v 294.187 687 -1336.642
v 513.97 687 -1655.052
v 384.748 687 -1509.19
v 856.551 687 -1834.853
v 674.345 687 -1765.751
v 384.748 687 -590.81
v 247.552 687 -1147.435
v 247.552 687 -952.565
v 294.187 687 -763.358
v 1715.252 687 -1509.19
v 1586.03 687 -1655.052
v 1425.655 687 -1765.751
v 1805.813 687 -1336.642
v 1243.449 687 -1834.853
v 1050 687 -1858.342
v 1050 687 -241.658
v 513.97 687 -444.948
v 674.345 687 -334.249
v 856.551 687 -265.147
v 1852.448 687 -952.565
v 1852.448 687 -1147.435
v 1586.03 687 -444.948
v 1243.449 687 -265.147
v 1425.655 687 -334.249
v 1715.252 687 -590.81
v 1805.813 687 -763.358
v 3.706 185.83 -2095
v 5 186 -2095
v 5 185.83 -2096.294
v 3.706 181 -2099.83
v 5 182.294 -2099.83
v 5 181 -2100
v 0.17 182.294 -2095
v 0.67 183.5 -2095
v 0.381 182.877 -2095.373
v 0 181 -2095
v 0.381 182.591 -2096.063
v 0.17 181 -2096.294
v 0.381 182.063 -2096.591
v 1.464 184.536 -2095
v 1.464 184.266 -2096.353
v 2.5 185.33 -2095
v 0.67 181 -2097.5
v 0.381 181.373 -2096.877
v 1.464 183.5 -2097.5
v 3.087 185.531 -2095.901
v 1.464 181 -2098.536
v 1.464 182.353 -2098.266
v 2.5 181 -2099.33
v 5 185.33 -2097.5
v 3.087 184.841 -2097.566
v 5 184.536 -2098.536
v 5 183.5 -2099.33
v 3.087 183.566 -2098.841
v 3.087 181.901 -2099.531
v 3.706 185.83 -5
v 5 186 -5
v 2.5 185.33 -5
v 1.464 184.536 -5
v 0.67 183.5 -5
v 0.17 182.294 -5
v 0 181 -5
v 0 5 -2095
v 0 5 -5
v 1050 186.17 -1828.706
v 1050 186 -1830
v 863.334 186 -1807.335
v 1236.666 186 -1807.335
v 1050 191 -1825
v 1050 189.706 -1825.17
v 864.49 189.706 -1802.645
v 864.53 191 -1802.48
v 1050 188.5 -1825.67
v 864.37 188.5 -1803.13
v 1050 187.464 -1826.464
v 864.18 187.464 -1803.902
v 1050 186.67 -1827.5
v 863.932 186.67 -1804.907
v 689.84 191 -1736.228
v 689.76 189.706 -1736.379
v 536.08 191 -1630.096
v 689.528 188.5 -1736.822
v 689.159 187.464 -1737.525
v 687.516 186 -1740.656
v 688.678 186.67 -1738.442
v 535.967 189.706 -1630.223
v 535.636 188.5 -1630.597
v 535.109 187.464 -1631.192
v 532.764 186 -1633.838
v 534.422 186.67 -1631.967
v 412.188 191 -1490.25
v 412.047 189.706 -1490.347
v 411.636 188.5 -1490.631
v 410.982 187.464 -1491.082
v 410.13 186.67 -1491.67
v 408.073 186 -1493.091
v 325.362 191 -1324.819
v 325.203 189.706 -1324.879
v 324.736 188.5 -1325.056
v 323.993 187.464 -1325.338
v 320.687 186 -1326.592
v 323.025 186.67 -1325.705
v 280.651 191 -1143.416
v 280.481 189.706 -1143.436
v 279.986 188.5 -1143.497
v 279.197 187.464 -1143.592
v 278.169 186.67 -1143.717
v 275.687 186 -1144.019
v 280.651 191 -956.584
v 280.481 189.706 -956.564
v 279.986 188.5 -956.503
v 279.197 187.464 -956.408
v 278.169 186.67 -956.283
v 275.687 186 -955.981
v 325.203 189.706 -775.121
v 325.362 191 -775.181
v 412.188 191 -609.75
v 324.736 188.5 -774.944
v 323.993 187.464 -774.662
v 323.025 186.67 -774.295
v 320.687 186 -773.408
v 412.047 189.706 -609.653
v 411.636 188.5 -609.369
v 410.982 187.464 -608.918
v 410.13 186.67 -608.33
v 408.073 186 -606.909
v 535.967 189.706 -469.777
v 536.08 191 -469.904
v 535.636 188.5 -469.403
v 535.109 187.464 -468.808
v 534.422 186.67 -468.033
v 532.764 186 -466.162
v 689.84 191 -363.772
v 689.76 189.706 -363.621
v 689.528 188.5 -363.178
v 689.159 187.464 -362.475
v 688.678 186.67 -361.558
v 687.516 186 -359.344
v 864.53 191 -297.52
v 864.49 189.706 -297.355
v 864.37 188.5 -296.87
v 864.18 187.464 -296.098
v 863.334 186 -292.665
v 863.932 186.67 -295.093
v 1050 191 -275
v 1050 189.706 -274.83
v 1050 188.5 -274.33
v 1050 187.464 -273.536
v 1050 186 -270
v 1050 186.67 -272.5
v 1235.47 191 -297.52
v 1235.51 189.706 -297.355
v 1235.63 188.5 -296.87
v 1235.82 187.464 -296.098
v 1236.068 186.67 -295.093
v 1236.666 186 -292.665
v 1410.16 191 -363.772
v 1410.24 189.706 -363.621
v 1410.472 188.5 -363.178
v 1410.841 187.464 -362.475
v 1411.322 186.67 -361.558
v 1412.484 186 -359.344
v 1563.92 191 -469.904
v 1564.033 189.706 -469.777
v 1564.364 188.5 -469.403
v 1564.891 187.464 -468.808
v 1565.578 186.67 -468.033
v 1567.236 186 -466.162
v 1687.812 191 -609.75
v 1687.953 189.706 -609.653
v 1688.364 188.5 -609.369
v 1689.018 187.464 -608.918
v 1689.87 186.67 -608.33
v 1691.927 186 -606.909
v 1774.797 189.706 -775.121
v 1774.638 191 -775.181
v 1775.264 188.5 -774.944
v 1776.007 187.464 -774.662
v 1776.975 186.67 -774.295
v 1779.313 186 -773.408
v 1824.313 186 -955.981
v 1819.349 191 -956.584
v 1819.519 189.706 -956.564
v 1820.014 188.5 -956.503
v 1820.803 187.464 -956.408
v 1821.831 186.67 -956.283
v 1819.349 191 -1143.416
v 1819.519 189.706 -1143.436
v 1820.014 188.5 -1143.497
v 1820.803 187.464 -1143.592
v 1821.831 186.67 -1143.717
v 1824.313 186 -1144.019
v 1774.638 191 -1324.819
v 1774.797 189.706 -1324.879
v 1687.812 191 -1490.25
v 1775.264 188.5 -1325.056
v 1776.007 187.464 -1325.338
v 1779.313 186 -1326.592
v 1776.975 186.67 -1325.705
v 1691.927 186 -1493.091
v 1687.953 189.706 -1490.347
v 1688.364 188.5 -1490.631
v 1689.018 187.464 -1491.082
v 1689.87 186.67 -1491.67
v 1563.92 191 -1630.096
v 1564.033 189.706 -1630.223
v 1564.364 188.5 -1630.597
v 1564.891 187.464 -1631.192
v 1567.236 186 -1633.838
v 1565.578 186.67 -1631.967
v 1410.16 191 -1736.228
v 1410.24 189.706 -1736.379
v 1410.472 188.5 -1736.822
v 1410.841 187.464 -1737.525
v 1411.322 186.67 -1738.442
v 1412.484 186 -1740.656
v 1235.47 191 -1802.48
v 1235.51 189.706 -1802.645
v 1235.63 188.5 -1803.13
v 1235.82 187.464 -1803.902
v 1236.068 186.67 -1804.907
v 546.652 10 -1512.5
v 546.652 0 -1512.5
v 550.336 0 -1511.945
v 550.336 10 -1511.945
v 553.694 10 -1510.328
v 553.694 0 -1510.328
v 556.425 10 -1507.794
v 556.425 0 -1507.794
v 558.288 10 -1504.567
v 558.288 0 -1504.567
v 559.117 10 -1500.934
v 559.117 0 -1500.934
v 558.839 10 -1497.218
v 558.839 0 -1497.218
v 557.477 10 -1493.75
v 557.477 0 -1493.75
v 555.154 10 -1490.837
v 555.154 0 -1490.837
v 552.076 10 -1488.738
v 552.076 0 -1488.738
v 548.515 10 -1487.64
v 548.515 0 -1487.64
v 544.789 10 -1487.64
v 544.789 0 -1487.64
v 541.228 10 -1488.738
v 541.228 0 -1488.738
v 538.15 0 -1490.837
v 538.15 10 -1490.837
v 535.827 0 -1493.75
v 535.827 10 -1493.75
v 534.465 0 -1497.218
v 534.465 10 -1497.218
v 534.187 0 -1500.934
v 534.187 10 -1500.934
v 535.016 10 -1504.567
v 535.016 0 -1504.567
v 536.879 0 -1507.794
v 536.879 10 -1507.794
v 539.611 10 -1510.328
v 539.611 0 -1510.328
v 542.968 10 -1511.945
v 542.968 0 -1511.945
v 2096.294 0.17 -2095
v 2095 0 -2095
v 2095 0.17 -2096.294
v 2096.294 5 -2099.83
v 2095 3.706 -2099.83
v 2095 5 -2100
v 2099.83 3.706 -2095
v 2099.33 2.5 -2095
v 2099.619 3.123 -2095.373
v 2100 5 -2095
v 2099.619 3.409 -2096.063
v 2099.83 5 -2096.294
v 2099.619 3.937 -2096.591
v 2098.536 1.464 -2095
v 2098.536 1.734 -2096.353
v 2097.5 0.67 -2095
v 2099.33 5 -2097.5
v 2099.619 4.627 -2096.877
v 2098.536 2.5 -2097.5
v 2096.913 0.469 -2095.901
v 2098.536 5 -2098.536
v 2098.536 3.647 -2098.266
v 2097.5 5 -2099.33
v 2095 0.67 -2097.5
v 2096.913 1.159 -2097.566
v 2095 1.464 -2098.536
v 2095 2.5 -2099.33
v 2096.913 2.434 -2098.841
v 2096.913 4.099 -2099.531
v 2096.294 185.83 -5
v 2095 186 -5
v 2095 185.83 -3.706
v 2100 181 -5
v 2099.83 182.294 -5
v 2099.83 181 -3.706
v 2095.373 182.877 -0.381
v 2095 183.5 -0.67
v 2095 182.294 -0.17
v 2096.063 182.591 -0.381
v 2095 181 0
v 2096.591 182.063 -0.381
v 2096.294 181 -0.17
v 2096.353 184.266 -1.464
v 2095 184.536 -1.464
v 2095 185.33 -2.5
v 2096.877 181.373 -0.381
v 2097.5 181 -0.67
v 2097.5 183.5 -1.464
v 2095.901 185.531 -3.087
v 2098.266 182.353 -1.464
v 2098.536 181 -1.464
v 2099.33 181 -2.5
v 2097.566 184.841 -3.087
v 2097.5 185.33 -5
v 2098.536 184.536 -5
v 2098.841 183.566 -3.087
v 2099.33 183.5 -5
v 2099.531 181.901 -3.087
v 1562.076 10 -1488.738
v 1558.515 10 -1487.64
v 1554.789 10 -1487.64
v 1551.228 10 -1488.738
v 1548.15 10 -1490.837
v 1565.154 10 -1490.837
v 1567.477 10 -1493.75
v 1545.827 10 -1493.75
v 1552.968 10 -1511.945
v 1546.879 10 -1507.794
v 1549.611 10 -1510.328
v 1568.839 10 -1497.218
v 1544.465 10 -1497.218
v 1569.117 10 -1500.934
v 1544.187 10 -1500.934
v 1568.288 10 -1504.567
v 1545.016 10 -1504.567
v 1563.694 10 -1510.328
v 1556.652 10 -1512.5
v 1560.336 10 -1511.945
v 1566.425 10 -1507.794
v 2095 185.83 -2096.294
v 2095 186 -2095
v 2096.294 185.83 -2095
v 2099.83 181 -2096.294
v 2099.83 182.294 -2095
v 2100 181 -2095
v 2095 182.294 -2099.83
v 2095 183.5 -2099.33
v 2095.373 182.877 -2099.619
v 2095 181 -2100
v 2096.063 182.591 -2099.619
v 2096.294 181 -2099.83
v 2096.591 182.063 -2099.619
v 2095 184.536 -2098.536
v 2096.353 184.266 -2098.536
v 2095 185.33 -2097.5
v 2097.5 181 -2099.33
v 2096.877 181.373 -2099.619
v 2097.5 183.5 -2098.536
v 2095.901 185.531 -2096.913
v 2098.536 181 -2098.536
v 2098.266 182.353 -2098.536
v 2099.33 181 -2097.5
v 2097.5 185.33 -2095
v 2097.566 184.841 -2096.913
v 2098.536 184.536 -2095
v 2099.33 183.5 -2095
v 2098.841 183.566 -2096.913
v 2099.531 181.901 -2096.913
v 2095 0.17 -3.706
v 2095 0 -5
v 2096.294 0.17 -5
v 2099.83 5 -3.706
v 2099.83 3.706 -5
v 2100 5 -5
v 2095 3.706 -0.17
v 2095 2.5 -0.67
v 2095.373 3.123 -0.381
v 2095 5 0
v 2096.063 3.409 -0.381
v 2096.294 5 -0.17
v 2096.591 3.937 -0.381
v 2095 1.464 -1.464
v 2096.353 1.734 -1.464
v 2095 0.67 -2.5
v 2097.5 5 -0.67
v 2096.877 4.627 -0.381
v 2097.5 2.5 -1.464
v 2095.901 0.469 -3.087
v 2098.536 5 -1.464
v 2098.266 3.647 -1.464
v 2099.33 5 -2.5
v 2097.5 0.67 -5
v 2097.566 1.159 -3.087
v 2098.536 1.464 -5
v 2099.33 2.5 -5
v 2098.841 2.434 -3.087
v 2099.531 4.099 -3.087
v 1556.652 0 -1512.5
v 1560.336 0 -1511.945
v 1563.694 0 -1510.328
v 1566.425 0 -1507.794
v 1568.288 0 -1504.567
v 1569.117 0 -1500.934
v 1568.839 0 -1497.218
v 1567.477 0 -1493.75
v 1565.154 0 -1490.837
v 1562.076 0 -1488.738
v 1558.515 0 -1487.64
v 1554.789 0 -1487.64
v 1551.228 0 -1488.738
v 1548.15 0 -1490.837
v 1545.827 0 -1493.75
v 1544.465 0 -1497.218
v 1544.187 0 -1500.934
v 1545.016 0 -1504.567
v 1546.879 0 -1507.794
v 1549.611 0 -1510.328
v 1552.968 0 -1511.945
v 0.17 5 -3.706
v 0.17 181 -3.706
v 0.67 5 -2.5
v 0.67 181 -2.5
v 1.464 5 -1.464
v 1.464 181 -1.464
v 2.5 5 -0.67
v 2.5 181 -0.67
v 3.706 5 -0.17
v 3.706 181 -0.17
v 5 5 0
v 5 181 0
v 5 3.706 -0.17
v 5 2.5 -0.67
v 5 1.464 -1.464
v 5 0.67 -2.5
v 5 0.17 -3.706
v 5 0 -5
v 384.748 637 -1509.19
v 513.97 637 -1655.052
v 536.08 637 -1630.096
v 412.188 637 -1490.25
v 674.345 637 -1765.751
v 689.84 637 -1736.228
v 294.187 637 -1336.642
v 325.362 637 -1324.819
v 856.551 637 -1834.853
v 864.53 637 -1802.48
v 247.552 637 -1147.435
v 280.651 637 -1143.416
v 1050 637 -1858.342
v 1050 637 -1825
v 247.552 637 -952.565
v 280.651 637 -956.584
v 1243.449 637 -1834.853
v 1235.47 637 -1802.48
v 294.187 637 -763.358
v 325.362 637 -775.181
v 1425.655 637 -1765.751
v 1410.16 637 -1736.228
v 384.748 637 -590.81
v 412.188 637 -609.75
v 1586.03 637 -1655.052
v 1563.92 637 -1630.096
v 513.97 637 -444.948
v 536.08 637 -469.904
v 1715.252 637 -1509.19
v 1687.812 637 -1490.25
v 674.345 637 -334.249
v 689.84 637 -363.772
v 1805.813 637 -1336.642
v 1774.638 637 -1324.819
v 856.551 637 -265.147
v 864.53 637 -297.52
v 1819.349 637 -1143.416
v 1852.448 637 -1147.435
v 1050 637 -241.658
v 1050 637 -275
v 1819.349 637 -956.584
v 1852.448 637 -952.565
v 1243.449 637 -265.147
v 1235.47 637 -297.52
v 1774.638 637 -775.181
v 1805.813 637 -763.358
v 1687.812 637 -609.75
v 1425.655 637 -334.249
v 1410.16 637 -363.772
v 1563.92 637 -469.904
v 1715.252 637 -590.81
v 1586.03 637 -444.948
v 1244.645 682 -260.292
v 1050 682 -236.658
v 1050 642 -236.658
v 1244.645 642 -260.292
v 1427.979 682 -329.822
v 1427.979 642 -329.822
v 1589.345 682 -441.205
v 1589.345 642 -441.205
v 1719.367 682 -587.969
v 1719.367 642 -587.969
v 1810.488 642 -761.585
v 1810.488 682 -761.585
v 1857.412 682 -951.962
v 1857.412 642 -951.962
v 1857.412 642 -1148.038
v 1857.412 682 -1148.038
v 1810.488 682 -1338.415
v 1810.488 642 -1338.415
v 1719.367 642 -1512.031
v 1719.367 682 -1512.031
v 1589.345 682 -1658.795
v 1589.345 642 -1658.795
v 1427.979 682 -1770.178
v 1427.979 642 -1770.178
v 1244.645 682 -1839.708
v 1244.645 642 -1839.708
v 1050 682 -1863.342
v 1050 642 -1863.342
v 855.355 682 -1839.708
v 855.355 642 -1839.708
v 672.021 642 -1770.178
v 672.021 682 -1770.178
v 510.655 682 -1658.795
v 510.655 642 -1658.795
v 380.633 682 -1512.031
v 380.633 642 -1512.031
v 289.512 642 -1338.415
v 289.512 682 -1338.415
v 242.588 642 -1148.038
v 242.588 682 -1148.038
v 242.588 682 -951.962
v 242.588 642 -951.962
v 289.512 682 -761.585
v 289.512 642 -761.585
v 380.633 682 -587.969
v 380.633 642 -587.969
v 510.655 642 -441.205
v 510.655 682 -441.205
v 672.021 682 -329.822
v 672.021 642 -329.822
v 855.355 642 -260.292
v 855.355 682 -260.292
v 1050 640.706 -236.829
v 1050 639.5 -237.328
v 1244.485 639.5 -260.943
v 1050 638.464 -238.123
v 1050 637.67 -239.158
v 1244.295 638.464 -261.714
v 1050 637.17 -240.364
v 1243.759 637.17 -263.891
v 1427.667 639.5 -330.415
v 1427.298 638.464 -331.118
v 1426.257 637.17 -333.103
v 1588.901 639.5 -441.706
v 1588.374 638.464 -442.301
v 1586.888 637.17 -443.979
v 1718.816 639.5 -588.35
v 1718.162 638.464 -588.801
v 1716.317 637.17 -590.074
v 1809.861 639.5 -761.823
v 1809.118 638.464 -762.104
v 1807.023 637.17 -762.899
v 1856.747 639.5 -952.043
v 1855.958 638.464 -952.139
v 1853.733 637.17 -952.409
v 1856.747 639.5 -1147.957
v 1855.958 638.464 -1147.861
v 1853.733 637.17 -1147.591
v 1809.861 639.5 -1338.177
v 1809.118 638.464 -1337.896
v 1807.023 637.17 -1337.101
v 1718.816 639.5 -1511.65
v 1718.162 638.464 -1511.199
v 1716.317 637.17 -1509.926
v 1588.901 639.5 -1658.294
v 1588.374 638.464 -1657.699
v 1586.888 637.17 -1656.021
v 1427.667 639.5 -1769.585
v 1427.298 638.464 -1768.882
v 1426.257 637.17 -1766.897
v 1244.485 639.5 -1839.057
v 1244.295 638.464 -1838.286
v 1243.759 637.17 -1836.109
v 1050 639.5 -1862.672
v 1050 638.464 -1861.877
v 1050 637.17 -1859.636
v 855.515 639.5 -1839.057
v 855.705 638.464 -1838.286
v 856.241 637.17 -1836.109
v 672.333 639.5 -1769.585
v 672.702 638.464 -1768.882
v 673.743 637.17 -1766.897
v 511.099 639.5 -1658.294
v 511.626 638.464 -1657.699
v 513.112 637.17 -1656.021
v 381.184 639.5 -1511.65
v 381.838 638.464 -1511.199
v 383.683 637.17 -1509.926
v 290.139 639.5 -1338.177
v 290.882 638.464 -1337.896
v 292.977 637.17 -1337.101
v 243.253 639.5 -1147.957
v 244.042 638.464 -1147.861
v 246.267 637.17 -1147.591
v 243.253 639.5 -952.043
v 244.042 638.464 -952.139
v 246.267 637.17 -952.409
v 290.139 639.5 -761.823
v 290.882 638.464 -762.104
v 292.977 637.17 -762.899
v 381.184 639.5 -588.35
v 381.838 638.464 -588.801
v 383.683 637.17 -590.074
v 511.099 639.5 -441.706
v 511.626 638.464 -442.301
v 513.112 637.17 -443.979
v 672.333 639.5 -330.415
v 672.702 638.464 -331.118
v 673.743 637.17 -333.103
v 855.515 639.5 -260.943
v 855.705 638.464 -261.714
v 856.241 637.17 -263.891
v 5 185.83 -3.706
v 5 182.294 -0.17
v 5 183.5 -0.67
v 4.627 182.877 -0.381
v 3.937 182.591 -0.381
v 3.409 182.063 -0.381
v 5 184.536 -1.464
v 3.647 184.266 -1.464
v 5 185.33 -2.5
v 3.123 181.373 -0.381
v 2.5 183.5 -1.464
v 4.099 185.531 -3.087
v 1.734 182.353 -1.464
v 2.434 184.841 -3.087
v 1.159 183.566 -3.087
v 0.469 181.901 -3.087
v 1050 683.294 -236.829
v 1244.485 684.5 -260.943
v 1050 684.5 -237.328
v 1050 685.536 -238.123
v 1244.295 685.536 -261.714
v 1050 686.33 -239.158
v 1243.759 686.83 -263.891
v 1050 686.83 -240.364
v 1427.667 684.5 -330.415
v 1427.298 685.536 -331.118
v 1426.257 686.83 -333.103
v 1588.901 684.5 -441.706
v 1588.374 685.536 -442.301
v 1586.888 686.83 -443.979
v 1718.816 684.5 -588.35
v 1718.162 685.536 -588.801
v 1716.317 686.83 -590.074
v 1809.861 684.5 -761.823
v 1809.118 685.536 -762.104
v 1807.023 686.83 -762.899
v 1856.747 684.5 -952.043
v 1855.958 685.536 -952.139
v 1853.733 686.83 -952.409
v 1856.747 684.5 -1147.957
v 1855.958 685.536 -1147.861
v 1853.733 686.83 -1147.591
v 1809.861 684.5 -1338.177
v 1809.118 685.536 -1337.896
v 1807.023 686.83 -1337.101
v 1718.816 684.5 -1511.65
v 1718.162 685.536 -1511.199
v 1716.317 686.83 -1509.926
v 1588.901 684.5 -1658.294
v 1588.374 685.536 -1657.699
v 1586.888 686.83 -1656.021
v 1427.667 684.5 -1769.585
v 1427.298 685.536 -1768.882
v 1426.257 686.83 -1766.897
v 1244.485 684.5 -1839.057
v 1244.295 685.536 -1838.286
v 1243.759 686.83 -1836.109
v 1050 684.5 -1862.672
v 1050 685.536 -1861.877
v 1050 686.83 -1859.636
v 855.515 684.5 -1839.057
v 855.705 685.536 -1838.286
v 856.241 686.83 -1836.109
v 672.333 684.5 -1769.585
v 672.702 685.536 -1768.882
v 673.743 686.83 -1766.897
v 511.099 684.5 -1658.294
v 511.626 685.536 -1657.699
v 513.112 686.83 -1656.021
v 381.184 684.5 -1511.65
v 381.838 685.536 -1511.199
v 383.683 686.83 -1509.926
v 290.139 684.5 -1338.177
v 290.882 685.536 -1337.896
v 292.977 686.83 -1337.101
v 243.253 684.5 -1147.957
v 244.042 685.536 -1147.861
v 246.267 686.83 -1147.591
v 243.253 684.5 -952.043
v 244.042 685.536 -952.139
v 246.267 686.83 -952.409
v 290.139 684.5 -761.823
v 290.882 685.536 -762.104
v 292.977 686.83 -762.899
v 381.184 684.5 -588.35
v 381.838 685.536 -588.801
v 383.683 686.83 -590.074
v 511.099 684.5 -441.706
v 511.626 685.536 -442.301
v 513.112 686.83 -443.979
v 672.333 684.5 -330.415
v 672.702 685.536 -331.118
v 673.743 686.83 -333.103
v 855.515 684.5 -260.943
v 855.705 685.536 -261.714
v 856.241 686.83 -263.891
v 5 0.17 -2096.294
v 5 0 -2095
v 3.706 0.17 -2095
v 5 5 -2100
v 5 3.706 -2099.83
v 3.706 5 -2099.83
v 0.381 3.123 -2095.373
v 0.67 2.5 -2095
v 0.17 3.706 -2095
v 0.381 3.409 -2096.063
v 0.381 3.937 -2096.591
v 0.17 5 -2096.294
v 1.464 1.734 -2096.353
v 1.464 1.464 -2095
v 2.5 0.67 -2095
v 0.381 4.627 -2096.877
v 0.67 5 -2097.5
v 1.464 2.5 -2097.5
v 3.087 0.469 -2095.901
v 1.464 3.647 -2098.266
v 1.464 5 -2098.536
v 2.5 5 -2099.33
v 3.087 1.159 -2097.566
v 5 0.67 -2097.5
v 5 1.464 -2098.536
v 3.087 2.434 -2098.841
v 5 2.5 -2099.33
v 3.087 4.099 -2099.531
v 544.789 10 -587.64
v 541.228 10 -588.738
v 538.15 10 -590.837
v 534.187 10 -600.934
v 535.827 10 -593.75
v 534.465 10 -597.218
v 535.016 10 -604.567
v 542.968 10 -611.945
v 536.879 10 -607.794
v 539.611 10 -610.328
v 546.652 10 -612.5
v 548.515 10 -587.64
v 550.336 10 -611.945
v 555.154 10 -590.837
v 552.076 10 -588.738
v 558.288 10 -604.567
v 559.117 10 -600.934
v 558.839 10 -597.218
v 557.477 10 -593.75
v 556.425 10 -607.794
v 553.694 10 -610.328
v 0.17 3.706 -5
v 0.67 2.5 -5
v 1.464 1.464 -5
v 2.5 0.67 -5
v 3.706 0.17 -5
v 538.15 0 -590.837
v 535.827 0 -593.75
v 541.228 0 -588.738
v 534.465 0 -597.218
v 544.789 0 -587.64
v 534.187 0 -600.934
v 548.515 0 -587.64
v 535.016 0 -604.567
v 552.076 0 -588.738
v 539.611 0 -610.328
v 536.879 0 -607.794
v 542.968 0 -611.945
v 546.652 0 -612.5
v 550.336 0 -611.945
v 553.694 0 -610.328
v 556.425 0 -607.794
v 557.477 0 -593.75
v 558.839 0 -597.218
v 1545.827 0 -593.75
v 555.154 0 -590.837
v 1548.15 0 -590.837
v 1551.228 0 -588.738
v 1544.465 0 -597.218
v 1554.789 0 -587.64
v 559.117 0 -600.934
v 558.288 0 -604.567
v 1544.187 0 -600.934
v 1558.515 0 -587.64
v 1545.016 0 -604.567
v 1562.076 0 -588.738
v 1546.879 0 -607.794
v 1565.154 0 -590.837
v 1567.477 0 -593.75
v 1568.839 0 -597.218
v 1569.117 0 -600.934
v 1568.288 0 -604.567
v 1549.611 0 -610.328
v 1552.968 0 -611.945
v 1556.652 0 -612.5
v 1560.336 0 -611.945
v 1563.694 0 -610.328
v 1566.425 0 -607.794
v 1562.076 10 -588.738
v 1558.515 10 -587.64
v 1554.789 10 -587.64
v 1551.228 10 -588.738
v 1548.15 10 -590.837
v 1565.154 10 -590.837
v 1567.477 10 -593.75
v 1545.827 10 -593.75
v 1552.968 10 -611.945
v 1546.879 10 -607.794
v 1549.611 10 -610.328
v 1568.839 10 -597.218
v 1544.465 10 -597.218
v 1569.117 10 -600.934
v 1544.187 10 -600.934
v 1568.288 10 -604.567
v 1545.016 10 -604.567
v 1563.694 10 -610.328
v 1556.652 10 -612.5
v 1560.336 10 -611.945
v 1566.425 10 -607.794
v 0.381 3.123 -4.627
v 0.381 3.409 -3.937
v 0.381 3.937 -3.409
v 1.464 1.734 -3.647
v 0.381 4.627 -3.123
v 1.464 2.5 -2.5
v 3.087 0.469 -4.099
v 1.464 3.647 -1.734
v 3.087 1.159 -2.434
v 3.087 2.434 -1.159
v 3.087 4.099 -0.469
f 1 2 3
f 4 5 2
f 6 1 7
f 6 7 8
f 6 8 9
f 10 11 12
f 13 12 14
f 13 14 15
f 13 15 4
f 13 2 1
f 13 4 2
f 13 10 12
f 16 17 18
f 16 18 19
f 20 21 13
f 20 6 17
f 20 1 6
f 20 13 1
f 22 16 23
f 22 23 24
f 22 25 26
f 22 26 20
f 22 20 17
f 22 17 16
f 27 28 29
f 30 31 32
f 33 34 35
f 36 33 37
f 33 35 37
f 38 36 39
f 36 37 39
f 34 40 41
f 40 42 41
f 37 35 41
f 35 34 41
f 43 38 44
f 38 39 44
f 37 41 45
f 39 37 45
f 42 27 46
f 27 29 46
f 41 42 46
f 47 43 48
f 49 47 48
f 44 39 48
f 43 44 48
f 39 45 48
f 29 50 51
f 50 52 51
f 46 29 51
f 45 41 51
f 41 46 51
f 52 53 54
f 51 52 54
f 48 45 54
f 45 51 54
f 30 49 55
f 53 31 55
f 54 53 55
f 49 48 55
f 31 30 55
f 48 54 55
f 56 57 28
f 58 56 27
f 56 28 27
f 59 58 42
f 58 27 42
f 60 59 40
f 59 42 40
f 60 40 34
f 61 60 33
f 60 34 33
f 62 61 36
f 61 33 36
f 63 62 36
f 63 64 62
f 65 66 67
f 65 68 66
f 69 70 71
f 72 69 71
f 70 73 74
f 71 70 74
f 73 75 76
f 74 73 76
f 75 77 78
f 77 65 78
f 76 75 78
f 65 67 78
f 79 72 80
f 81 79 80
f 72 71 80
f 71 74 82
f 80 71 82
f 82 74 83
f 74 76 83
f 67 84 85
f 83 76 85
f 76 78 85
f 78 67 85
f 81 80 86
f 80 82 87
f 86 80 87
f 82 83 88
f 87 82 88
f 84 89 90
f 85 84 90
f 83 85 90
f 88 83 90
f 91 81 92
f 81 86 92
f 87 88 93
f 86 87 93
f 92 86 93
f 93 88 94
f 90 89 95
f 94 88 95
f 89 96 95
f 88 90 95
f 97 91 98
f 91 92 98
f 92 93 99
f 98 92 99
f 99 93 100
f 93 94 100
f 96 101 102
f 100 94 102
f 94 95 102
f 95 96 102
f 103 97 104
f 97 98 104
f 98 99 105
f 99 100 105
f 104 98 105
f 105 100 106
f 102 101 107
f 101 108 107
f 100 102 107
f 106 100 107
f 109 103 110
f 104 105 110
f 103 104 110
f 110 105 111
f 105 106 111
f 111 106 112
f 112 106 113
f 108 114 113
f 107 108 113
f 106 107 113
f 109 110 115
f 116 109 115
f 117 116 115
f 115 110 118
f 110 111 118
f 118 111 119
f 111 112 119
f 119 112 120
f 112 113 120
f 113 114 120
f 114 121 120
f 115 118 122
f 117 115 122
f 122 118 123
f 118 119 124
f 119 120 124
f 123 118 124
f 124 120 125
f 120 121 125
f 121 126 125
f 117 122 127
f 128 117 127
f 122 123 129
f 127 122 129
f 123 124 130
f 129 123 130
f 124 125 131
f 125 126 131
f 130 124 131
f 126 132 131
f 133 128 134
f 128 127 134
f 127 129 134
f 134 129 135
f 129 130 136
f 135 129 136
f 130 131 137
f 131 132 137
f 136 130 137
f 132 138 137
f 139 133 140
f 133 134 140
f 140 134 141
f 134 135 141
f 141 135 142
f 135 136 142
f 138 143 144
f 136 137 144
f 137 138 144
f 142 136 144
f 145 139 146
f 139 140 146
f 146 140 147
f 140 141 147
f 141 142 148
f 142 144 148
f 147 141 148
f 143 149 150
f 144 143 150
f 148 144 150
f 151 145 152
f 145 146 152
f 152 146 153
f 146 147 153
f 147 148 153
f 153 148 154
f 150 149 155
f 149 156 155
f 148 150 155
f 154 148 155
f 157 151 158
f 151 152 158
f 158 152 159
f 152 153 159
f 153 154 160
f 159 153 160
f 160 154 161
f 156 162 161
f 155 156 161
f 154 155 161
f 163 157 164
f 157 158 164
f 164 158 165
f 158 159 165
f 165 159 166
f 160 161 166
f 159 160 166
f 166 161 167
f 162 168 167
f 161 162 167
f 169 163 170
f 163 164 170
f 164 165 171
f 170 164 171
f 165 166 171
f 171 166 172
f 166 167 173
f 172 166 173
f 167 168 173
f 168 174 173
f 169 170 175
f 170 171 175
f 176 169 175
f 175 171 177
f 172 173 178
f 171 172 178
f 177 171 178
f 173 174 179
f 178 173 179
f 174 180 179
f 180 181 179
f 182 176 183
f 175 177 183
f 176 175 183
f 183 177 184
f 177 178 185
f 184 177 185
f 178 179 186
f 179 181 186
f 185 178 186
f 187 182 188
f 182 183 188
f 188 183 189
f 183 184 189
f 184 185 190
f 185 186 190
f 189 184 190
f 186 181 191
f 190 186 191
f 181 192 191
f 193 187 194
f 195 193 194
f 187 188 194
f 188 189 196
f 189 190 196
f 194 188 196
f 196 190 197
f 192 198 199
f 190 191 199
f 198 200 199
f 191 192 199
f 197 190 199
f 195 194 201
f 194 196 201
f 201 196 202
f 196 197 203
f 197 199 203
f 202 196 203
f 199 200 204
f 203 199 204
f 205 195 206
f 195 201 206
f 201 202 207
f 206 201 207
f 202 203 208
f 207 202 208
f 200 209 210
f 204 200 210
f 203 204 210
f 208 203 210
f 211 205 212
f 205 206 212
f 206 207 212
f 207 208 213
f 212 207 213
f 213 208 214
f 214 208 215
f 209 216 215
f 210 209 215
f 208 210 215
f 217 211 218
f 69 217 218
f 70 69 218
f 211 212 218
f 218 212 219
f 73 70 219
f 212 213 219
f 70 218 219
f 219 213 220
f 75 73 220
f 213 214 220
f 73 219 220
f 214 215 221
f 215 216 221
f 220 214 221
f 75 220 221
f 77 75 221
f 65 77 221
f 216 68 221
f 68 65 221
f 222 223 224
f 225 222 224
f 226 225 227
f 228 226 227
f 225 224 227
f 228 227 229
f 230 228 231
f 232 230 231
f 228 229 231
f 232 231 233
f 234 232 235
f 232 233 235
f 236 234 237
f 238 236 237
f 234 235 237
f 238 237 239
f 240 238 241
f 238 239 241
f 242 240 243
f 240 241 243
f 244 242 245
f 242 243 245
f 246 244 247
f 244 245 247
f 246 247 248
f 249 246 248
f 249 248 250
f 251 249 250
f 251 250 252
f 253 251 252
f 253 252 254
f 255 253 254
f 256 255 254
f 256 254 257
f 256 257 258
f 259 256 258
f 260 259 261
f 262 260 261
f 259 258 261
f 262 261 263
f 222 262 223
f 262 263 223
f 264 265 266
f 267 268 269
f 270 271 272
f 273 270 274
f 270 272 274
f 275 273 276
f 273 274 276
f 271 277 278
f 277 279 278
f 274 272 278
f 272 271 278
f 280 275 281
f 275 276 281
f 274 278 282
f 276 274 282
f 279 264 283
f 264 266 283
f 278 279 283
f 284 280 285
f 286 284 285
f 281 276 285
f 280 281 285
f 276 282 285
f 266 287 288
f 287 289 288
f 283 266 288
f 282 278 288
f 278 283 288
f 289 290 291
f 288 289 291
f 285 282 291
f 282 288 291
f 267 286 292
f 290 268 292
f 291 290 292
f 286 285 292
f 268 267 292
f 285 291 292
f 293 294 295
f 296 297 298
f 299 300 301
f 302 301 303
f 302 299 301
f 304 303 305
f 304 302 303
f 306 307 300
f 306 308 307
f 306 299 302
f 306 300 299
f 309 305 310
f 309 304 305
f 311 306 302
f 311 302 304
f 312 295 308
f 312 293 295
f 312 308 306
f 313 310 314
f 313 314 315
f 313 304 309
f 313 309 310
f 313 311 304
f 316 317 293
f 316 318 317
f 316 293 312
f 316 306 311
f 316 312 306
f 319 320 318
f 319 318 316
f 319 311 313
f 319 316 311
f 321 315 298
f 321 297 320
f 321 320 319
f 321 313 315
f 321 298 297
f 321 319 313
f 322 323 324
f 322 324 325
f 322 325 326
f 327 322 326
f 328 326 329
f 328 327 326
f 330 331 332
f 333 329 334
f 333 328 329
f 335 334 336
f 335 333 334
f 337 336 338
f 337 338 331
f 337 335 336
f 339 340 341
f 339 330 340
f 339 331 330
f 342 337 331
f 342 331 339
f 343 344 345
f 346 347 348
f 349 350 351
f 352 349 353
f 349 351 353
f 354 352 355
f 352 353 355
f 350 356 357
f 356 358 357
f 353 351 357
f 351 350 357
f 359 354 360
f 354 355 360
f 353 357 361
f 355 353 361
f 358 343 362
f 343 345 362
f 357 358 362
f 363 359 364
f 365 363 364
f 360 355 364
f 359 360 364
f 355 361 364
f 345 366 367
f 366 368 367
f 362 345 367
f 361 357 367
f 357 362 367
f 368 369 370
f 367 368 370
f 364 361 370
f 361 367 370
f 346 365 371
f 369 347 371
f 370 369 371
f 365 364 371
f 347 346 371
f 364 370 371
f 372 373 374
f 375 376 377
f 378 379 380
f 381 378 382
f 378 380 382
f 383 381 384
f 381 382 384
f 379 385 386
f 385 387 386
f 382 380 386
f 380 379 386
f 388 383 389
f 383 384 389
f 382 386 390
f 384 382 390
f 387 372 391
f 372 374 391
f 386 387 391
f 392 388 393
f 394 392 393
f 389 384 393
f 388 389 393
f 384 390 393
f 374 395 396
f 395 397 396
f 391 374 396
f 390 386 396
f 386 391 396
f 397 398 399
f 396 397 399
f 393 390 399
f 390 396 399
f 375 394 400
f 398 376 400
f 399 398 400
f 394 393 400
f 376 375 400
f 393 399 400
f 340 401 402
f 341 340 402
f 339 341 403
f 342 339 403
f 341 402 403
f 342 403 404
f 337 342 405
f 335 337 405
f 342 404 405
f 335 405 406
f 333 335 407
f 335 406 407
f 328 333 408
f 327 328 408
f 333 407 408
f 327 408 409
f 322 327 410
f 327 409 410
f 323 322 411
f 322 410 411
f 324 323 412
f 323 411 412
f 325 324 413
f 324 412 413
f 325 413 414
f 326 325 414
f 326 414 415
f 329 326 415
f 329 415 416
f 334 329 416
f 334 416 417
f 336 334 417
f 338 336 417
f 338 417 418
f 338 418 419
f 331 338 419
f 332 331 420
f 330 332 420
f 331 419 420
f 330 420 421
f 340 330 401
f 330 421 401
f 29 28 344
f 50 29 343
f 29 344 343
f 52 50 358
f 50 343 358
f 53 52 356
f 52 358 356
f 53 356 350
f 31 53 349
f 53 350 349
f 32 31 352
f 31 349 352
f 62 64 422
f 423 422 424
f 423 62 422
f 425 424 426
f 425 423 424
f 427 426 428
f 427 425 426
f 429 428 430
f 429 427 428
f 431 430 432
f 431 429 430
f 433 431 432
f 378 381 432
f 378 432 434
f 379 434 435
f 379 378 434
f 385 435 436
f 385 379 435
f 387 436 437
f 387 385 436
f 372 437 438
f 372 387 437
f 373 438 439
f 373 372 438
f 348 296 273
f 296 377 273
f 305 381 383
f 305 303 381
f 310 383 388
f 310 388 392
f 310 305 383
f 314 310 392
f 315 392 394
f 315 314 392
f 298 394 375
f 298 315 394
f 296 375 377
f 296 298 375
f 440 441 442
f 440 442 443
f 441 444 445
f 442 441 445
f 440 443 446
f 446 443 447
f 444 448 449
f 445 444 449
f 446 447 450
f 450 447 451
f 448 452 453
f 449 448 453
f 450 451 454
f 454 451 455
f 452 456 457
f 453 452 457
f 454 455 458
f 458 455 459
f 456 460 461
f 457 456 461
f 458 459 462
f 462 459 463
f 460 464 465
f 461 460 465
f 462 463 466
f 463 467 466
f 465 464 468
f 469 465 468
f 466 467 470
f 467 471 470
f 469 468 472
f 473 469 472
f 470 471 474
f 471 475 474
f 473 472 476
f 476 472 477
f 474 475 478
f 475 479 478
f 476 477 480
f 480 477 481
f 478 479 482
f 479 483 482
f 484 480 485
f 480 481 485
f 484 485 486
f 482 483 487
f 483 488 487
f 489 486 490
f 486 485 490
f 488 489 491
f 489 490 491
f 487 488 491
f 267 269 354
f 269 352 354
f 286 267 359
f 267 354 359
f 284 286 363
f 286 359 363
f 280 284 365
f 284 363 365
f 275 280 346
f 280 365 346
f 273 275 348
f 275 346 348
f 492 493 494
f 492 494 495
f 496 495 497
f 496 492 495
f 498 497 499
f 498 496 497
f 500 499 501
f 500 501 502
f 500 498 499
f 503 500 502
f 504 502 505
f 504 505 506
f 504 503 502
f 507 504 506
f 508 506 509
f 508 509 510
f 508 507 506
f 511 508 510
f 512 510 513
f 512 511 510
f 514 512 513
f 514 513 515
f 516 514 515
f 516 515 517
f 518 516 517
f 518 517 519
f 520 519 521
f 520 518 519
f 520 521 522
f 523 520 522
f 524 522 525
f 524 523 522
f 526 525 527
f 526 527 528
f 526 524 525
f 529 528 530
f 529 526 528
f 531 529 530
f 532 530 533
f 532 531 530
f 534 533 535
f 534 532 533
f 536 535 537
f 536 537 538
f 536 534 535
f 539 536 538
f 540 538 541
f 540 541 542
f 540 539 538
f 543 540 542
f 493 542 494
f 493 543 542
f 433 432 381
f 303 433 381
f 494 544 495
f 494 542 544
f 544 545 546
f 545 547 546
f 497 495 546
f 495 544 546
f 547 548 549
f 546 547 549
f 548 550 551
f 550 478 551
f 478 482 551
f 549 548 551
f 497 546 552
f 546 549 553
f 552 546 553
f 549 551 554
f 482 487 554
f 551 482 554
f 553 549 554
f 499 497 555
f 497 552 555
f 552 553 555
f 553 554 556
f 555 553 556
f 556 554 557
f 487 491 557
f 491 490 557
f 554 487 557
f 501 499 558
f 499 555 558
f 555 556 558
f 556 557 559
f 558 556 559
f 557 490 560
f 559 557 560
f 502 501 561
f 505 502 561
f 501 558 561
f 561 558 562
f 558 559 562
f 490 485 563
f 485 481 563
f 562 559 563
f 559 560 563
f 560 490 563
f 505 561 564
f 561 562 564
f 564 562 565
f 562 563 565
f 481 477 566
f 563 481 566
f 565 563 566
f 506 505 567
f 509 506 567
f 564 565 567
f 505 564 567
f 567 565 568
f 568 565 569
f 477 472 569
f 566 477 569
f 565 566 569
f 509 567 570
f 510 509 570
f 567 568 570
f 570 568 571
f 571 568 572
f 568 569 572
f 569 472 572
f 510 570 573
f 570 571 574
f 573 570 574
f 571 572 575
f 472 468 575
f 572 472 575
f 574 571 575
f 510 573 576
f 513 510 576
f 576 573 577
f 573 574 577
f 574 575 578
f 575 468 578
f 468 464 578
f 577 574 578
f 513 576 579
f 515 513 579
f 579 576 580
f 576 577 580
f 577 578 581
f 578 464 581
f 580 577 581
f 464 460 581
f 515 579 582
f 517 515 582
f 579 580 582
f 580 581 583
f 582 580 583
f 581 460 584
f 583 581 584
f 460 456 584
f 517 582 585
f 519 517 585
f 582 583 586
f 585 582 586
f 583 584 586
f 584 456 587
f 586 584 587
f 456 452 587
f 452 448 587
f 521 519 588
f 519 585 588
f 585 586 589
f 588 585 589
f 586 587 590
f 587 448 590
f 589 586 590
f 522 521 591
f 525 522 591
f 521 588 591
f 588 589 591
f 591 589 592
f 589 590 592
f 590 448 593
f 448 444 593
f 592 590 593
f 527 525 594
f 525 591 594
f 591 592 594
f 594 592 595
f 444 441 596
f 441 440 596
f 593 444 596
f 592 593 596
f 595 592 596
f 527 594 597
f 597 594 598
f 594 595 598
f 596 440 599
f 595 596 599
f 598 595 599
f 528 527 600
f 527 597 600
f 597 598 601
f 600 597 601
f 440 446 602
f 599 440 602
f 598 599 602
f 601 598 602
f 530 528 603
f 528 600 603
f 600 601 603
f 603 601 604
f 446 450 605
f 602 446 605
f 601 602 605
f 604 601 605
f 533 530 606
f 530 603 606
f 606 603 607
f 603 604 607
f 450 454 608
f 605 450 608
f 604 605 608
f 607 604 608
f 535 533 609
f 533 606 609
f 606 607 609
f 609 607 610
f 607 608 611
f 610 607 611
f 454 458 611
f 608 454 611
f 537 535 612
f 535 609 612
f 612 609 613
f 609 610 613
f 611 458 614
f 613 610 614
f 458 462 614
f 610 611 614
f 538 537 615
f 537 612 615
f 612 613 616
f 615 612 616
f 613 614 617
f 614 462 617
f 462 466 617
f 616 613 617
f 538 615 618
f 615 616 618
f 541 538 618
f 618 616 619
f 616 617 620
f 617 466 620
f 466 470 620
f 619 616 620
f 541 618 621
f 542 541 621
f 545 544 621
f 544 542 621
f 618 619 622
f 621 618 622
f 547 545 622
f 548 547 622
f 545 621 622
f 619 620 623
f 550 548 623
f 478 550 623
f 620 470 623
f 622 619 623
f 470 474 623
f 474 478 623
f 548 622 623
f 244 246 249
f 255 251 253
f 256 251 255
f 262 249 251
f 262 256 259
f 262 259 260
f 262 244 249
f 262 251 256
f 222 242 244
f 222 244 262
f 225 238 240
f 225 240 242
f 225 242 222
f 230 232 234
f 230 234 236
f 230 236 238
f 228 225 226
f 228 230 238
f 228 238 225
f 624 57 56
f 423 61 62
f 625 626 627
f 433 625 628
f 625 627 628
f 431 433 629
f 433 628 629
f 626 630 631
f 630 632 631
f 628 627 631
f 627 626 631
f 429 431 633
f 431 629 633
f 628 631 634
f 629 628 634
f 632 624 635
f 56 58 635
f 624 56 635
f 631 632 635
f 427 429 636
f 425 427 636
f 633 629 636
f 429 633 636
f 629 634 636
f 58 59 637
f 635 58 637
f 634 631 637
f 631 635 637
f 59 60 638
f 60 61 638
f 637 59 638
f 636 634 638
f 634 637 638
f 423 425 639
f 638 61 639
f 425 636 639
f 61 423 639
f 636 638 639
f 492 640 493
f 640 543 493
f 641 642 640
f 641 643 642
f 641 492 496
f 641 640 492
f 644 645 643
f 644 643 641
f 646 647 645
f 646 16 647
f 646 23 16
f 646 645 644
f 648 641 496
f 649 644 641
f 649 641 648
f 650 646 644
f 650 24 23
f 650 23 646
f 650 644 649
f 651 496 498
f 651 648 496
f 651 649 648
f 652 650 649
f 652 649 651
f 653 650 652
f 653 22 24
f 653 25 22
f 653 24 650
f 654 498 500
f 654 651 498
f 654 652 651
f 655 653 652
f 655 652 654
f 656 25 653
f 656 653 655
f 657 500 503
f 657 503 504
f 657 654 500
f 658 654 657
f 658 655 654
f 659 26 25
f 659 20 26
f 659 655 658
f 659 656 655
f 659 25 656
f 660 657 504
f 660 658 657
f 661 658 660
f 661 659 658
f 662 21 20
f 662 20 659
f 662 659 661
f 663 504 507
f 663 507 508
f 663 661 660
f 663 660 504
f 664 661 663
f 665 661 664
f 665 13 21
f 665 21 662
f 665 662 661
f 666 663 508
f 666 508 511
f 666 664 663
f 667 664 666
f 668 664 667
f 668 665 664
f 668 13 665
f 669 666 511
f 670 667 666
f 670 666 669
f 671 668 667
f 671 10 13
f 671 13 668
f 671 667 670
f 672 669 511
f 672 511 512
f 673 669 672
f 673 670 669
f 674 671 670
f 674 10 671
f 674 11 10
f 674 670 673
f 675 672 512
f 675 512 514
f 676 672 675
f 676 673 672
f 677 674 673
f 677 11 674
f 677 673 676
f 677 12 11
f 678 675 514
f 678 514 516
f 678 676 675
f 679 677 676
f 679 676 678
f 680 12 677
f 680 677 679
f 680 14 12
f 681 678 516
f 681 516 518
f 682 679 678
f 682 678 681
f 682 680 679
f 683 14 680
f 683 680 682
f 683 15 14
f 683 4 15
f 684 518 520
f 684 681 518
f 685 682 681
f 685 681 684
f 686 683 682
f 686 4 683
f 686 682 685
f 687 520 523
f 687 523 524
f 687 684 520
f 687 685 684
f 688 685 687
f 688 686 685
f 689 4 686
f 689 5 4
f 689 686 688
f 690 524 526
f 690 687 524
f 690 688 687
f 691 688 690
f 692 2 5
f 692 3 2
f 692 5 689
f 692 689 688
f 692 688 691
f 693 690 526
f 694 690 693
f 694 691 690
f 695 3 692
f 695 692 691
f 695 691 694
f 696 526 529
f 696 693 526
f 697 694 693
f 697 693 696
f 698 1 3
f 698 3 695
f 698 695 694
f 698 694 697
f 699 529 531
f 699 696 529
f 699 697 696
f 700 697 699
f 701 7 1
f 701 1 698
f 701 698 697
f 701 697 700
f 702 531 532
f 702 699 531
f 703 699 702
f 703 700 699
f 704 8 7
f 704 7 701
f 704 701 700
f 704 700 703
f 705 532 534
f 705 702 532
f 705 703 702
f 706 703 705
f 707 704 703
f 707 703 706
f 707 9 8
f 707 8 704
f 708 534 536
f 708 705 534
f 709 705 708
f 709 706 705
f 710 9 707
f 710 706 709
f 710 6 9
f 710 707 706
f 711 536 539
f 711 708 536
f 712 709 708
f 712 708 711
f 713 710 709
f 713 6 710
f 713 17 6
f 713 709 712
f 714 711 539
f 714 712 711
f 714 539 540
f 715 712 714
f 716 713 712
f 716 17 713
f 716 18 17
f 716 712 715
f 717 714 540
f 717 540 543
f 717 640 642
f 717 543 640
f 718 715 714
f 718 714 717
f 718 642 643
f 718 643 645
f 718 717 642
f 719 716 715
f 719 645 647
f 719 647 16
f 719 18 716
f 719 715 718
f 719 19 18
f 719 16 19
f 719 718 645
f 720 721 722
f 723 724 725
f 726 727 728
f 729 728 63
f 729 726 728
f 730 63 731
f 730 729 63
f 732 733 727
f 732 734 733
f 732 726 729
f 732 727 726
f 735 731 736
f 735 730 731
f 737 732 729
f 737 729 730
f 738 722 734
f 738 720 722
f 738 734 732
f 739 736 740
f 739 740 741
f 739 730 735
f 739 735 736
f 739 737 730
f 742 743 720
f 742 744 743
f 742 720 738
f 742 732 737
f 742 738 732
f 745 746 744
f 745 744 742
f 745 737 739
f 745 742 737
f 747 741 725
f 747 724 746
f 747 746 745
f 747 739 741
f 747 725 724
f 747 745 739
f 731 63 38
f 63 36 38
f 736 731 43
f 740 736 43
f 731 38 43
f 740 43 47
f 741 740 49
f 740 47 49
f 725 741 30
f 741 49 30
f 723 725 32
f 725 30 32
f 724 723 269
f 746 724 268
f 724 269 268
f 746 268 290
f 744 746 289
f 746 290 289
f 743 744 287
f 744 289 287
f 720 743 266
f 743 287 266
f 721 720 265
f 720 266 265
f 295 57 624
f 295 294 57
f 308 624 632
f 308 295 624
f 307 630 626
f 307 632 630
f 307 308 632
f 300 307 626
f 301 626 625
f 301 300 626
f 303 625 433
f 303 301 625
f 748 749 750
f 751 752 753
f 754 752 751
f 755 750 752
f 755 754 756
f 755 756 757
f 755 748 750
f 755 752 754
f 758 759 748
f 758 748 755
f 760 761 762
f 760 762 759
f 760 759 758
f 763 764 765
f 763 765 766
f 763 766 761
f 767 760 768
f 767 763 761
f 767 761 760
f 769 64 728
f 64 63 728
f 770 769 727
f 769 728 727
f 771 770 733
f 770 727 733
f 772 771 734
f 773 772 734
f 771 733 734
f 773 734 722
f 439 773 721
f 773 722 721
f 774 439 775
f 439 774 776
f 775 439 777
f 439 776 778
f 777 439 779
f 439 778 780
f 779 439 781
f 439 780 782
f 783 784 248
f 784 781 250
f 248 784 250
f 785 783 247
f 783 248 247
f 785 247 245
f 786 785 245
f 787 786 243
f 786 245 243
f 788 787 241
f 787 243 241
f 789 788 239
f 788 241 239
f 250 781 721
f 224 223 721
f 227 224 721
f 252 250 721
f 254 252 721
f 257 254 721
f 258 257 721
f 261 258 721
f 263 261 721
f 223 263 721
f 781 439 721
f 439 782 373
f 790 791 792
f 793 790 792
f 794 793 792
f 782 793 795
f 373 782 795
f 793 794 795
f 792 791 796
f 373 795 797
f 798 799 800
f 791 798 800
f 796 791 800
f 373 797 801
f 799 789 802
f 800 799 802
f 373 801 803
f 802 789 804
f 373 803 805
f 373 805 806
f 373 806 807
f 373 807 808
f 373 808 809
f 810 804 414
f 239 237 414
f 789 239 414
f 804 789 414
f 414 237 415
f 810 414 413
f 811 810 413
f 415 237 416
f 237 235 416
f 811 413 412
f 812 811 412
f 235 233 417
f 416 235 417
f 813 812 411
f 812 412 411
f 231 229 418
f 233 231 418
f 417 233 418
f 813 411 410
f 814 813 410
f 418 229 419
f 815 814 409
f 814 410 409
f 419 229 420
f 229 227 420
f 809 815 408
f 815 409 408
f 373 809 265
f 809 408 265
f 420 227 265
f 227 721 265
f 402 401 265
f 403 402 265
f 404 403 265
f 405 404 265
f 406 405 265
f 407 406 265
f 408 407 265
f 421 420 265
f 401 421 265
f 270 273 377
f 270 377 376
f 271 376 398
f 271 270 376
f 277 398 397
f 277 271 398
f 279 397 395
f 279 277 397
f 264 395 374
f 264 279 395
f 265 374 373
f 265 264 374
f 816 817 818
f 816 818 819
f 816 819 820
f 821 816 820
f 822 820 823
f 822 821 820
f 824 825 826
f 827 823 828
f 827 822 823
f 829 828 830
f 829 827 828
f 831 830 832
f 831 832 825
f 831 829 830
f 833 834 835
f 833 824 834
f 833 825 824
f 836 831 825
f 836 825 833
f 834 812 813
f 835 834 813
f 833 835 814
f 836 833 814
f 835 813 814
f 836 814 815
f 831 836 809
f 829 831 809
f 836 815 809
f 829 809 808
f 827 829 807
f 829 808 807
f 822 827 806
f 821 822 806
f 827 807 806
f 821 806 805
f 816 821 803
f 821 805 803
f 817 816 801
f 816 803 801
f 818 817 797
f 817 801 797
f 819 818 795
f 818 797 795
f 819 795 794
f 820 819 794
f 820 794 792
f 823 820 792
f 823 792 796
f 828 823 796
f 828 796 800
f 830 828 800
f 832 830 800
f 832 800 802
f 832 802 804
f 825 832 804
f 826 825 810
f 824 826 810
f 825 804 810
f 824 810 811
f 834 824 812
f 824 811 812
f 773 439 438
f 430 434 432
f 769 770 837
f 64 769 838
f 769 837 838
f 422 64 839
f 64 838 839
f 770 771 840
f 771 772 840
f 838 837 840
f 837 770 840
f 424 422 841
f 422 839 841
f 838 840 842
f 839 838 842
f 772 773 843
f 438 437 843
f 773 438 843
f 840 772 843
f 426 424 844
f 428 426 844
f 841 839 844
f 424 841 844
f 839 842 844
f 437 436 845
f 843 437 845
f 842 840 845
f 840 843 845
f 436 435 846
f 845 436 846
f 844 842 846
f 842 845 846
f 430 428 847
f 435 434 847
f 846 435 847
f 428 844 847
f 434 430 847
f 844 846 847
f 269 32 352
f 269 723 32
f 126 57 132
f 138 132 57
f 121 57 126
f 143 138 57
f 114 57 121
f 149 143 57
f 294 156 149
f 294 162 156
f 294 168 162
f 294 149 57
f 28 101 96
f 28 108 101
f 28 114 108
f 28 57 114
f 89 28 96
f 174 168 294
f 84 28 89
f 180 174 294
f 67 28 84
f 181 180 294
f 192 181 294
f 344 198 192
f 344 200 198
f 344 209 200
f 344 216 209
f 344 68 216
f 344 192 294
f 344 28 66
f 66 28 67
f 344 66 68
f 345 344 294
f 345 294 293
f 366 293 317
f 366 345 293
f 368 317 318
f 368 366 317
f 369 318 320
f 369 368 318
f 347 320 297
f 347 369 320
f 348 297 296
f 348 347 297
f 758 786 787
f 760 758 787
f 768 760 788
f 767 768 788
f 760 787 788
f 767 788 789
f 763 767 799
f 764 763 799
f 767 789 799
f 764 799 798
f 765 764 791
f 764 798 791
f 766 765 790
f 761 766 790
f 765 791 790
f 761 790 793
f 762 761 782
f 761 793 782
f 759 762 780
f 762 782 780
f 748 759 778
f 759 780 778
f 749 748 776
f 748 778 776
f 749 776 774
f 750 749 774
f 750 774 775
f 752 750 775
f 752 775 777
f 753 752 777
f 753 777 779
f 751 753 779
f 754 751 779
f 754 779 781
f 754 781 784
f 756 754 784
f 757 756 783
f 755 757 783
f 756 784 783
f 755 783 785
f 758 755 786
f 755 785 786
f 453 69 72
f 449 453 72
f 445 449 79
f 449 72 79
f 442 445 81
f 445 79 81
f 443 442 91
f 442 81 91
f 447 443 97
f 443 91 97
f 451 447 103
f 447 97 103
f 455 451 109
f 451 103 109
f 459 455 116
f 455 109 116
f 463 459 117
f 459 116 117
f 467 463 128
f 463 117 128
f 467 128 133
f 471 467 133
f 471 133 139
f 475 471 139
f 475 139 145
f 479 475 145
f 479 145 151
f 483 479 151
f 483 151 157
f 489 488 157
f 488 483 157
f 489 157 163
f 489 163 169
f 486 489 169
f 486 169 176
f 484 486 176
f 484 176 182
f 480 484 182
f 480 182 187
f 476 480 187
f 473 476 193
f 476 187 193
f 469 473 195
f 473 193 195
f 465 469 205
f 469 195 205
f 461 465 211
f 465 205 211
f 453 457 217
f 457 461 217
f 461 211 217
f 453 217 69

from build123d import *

# Parameters (mm, degrees)
SKETCH1_W           = 2100
SKETCH1_H           = 2100
BOSS_EXTRUDE1_DEPTH = 186
SKETCH2_R           = 775
BOSS_EXTRUDE2_DEPTH = 501
SKETCH3_R           = 813.34174717
BOSS_EXTRUDE3_DEPTH = 50
SKETCH4_R           = 12.5
CUT_EXTRUDE1_DEPTH  = 10
FILLET1_R           = 5


with BuildPart() as part:
    # Sketch1 → Boss-Extrude1 (new body)
    with BuildSketch(Plane(origin=(0, 0, 0), x_dir=(1, 0, 0), z_dir=(0, 1, 0))):
        with Locations((1050, 1050)):
            Rectangle(SKETCH1_W, SKETCH1_H)
    extrude(amount=BOSS_EXTRUDE1_DEPTH)

    # Sketch2 → Boss-Extrude2 (add)
    with BuildSketch(Plane(origin=(0, 186, 0), x_dir=(1, 0, 0), z_dir=(0, 1, 0))):
        with Locations(Location((1050, 1050, 0), (0, 0, 90))):
            Circle(SKETCH2_R)
    extrude(amount=BOSS_EXTRUDE2_DEPTH)

    # Sketch3 → Boss-Extrude3 (add)
    with BuildSketch(Plane(origin=(0, 687, 0), x_dir=(1, 0, 0), z_dir=(0, 1, 0))):
        with Locations(Location((1050, 1050, 0), (0, 0, 270))):
            Circle(SKETCH3_R)
    extrude(amount=-BOSS_EXTRUDE3_DEPTH)

    # Sketch4 → Cut-Extrude1 (cut)
    with BuildSketch(Plane.XZ):
        with Locations(Location((546.652032242, -600, 0), (0, 0, 270))):
            Circle(SKETCH4_R)
        with Locations(Location((1556.652032242, -600, 0), (0, 0, 270))):
            Circle(SKETCH4_R)
        with Locations(Location((546.652032242, -1500, 0), (0, 0, 270))):
            Circle(SKETCH4_R)
        with Locations(Location((1556.652032242, -1500, 0), (0, 0, 270))):
            Circle(SKETCH4_R)
    extrude(amount=-CUT_EXTRUDE1_DEPTH, mode=Mode.SUBTRACT)

    # Fillet1
    fillet1_edges = [part.edges().sort_by_distance(p)[0] for p in [
        (2100, 186, -1050),
        (1050, 186, -2100),
        (1050, 186, -275),
        (1050, 687, -1863.34174717),
        (1050, 637, -1863.34174717),
        (0, 186, -1050),
        (1050, 0, -2100),
        (2100, 0, -1050),
        (1050, 0, 0),
        (0, 0, -1050),
        (1050, 186, 0),
        (0, 93, -2100),
        (2100, 93, -2100),
        (2100, 93, 0),
        (0, 93, 0),
    ]]
    fillet(fillet1_edges, radius=FILLET1_R)


solid = part.part
